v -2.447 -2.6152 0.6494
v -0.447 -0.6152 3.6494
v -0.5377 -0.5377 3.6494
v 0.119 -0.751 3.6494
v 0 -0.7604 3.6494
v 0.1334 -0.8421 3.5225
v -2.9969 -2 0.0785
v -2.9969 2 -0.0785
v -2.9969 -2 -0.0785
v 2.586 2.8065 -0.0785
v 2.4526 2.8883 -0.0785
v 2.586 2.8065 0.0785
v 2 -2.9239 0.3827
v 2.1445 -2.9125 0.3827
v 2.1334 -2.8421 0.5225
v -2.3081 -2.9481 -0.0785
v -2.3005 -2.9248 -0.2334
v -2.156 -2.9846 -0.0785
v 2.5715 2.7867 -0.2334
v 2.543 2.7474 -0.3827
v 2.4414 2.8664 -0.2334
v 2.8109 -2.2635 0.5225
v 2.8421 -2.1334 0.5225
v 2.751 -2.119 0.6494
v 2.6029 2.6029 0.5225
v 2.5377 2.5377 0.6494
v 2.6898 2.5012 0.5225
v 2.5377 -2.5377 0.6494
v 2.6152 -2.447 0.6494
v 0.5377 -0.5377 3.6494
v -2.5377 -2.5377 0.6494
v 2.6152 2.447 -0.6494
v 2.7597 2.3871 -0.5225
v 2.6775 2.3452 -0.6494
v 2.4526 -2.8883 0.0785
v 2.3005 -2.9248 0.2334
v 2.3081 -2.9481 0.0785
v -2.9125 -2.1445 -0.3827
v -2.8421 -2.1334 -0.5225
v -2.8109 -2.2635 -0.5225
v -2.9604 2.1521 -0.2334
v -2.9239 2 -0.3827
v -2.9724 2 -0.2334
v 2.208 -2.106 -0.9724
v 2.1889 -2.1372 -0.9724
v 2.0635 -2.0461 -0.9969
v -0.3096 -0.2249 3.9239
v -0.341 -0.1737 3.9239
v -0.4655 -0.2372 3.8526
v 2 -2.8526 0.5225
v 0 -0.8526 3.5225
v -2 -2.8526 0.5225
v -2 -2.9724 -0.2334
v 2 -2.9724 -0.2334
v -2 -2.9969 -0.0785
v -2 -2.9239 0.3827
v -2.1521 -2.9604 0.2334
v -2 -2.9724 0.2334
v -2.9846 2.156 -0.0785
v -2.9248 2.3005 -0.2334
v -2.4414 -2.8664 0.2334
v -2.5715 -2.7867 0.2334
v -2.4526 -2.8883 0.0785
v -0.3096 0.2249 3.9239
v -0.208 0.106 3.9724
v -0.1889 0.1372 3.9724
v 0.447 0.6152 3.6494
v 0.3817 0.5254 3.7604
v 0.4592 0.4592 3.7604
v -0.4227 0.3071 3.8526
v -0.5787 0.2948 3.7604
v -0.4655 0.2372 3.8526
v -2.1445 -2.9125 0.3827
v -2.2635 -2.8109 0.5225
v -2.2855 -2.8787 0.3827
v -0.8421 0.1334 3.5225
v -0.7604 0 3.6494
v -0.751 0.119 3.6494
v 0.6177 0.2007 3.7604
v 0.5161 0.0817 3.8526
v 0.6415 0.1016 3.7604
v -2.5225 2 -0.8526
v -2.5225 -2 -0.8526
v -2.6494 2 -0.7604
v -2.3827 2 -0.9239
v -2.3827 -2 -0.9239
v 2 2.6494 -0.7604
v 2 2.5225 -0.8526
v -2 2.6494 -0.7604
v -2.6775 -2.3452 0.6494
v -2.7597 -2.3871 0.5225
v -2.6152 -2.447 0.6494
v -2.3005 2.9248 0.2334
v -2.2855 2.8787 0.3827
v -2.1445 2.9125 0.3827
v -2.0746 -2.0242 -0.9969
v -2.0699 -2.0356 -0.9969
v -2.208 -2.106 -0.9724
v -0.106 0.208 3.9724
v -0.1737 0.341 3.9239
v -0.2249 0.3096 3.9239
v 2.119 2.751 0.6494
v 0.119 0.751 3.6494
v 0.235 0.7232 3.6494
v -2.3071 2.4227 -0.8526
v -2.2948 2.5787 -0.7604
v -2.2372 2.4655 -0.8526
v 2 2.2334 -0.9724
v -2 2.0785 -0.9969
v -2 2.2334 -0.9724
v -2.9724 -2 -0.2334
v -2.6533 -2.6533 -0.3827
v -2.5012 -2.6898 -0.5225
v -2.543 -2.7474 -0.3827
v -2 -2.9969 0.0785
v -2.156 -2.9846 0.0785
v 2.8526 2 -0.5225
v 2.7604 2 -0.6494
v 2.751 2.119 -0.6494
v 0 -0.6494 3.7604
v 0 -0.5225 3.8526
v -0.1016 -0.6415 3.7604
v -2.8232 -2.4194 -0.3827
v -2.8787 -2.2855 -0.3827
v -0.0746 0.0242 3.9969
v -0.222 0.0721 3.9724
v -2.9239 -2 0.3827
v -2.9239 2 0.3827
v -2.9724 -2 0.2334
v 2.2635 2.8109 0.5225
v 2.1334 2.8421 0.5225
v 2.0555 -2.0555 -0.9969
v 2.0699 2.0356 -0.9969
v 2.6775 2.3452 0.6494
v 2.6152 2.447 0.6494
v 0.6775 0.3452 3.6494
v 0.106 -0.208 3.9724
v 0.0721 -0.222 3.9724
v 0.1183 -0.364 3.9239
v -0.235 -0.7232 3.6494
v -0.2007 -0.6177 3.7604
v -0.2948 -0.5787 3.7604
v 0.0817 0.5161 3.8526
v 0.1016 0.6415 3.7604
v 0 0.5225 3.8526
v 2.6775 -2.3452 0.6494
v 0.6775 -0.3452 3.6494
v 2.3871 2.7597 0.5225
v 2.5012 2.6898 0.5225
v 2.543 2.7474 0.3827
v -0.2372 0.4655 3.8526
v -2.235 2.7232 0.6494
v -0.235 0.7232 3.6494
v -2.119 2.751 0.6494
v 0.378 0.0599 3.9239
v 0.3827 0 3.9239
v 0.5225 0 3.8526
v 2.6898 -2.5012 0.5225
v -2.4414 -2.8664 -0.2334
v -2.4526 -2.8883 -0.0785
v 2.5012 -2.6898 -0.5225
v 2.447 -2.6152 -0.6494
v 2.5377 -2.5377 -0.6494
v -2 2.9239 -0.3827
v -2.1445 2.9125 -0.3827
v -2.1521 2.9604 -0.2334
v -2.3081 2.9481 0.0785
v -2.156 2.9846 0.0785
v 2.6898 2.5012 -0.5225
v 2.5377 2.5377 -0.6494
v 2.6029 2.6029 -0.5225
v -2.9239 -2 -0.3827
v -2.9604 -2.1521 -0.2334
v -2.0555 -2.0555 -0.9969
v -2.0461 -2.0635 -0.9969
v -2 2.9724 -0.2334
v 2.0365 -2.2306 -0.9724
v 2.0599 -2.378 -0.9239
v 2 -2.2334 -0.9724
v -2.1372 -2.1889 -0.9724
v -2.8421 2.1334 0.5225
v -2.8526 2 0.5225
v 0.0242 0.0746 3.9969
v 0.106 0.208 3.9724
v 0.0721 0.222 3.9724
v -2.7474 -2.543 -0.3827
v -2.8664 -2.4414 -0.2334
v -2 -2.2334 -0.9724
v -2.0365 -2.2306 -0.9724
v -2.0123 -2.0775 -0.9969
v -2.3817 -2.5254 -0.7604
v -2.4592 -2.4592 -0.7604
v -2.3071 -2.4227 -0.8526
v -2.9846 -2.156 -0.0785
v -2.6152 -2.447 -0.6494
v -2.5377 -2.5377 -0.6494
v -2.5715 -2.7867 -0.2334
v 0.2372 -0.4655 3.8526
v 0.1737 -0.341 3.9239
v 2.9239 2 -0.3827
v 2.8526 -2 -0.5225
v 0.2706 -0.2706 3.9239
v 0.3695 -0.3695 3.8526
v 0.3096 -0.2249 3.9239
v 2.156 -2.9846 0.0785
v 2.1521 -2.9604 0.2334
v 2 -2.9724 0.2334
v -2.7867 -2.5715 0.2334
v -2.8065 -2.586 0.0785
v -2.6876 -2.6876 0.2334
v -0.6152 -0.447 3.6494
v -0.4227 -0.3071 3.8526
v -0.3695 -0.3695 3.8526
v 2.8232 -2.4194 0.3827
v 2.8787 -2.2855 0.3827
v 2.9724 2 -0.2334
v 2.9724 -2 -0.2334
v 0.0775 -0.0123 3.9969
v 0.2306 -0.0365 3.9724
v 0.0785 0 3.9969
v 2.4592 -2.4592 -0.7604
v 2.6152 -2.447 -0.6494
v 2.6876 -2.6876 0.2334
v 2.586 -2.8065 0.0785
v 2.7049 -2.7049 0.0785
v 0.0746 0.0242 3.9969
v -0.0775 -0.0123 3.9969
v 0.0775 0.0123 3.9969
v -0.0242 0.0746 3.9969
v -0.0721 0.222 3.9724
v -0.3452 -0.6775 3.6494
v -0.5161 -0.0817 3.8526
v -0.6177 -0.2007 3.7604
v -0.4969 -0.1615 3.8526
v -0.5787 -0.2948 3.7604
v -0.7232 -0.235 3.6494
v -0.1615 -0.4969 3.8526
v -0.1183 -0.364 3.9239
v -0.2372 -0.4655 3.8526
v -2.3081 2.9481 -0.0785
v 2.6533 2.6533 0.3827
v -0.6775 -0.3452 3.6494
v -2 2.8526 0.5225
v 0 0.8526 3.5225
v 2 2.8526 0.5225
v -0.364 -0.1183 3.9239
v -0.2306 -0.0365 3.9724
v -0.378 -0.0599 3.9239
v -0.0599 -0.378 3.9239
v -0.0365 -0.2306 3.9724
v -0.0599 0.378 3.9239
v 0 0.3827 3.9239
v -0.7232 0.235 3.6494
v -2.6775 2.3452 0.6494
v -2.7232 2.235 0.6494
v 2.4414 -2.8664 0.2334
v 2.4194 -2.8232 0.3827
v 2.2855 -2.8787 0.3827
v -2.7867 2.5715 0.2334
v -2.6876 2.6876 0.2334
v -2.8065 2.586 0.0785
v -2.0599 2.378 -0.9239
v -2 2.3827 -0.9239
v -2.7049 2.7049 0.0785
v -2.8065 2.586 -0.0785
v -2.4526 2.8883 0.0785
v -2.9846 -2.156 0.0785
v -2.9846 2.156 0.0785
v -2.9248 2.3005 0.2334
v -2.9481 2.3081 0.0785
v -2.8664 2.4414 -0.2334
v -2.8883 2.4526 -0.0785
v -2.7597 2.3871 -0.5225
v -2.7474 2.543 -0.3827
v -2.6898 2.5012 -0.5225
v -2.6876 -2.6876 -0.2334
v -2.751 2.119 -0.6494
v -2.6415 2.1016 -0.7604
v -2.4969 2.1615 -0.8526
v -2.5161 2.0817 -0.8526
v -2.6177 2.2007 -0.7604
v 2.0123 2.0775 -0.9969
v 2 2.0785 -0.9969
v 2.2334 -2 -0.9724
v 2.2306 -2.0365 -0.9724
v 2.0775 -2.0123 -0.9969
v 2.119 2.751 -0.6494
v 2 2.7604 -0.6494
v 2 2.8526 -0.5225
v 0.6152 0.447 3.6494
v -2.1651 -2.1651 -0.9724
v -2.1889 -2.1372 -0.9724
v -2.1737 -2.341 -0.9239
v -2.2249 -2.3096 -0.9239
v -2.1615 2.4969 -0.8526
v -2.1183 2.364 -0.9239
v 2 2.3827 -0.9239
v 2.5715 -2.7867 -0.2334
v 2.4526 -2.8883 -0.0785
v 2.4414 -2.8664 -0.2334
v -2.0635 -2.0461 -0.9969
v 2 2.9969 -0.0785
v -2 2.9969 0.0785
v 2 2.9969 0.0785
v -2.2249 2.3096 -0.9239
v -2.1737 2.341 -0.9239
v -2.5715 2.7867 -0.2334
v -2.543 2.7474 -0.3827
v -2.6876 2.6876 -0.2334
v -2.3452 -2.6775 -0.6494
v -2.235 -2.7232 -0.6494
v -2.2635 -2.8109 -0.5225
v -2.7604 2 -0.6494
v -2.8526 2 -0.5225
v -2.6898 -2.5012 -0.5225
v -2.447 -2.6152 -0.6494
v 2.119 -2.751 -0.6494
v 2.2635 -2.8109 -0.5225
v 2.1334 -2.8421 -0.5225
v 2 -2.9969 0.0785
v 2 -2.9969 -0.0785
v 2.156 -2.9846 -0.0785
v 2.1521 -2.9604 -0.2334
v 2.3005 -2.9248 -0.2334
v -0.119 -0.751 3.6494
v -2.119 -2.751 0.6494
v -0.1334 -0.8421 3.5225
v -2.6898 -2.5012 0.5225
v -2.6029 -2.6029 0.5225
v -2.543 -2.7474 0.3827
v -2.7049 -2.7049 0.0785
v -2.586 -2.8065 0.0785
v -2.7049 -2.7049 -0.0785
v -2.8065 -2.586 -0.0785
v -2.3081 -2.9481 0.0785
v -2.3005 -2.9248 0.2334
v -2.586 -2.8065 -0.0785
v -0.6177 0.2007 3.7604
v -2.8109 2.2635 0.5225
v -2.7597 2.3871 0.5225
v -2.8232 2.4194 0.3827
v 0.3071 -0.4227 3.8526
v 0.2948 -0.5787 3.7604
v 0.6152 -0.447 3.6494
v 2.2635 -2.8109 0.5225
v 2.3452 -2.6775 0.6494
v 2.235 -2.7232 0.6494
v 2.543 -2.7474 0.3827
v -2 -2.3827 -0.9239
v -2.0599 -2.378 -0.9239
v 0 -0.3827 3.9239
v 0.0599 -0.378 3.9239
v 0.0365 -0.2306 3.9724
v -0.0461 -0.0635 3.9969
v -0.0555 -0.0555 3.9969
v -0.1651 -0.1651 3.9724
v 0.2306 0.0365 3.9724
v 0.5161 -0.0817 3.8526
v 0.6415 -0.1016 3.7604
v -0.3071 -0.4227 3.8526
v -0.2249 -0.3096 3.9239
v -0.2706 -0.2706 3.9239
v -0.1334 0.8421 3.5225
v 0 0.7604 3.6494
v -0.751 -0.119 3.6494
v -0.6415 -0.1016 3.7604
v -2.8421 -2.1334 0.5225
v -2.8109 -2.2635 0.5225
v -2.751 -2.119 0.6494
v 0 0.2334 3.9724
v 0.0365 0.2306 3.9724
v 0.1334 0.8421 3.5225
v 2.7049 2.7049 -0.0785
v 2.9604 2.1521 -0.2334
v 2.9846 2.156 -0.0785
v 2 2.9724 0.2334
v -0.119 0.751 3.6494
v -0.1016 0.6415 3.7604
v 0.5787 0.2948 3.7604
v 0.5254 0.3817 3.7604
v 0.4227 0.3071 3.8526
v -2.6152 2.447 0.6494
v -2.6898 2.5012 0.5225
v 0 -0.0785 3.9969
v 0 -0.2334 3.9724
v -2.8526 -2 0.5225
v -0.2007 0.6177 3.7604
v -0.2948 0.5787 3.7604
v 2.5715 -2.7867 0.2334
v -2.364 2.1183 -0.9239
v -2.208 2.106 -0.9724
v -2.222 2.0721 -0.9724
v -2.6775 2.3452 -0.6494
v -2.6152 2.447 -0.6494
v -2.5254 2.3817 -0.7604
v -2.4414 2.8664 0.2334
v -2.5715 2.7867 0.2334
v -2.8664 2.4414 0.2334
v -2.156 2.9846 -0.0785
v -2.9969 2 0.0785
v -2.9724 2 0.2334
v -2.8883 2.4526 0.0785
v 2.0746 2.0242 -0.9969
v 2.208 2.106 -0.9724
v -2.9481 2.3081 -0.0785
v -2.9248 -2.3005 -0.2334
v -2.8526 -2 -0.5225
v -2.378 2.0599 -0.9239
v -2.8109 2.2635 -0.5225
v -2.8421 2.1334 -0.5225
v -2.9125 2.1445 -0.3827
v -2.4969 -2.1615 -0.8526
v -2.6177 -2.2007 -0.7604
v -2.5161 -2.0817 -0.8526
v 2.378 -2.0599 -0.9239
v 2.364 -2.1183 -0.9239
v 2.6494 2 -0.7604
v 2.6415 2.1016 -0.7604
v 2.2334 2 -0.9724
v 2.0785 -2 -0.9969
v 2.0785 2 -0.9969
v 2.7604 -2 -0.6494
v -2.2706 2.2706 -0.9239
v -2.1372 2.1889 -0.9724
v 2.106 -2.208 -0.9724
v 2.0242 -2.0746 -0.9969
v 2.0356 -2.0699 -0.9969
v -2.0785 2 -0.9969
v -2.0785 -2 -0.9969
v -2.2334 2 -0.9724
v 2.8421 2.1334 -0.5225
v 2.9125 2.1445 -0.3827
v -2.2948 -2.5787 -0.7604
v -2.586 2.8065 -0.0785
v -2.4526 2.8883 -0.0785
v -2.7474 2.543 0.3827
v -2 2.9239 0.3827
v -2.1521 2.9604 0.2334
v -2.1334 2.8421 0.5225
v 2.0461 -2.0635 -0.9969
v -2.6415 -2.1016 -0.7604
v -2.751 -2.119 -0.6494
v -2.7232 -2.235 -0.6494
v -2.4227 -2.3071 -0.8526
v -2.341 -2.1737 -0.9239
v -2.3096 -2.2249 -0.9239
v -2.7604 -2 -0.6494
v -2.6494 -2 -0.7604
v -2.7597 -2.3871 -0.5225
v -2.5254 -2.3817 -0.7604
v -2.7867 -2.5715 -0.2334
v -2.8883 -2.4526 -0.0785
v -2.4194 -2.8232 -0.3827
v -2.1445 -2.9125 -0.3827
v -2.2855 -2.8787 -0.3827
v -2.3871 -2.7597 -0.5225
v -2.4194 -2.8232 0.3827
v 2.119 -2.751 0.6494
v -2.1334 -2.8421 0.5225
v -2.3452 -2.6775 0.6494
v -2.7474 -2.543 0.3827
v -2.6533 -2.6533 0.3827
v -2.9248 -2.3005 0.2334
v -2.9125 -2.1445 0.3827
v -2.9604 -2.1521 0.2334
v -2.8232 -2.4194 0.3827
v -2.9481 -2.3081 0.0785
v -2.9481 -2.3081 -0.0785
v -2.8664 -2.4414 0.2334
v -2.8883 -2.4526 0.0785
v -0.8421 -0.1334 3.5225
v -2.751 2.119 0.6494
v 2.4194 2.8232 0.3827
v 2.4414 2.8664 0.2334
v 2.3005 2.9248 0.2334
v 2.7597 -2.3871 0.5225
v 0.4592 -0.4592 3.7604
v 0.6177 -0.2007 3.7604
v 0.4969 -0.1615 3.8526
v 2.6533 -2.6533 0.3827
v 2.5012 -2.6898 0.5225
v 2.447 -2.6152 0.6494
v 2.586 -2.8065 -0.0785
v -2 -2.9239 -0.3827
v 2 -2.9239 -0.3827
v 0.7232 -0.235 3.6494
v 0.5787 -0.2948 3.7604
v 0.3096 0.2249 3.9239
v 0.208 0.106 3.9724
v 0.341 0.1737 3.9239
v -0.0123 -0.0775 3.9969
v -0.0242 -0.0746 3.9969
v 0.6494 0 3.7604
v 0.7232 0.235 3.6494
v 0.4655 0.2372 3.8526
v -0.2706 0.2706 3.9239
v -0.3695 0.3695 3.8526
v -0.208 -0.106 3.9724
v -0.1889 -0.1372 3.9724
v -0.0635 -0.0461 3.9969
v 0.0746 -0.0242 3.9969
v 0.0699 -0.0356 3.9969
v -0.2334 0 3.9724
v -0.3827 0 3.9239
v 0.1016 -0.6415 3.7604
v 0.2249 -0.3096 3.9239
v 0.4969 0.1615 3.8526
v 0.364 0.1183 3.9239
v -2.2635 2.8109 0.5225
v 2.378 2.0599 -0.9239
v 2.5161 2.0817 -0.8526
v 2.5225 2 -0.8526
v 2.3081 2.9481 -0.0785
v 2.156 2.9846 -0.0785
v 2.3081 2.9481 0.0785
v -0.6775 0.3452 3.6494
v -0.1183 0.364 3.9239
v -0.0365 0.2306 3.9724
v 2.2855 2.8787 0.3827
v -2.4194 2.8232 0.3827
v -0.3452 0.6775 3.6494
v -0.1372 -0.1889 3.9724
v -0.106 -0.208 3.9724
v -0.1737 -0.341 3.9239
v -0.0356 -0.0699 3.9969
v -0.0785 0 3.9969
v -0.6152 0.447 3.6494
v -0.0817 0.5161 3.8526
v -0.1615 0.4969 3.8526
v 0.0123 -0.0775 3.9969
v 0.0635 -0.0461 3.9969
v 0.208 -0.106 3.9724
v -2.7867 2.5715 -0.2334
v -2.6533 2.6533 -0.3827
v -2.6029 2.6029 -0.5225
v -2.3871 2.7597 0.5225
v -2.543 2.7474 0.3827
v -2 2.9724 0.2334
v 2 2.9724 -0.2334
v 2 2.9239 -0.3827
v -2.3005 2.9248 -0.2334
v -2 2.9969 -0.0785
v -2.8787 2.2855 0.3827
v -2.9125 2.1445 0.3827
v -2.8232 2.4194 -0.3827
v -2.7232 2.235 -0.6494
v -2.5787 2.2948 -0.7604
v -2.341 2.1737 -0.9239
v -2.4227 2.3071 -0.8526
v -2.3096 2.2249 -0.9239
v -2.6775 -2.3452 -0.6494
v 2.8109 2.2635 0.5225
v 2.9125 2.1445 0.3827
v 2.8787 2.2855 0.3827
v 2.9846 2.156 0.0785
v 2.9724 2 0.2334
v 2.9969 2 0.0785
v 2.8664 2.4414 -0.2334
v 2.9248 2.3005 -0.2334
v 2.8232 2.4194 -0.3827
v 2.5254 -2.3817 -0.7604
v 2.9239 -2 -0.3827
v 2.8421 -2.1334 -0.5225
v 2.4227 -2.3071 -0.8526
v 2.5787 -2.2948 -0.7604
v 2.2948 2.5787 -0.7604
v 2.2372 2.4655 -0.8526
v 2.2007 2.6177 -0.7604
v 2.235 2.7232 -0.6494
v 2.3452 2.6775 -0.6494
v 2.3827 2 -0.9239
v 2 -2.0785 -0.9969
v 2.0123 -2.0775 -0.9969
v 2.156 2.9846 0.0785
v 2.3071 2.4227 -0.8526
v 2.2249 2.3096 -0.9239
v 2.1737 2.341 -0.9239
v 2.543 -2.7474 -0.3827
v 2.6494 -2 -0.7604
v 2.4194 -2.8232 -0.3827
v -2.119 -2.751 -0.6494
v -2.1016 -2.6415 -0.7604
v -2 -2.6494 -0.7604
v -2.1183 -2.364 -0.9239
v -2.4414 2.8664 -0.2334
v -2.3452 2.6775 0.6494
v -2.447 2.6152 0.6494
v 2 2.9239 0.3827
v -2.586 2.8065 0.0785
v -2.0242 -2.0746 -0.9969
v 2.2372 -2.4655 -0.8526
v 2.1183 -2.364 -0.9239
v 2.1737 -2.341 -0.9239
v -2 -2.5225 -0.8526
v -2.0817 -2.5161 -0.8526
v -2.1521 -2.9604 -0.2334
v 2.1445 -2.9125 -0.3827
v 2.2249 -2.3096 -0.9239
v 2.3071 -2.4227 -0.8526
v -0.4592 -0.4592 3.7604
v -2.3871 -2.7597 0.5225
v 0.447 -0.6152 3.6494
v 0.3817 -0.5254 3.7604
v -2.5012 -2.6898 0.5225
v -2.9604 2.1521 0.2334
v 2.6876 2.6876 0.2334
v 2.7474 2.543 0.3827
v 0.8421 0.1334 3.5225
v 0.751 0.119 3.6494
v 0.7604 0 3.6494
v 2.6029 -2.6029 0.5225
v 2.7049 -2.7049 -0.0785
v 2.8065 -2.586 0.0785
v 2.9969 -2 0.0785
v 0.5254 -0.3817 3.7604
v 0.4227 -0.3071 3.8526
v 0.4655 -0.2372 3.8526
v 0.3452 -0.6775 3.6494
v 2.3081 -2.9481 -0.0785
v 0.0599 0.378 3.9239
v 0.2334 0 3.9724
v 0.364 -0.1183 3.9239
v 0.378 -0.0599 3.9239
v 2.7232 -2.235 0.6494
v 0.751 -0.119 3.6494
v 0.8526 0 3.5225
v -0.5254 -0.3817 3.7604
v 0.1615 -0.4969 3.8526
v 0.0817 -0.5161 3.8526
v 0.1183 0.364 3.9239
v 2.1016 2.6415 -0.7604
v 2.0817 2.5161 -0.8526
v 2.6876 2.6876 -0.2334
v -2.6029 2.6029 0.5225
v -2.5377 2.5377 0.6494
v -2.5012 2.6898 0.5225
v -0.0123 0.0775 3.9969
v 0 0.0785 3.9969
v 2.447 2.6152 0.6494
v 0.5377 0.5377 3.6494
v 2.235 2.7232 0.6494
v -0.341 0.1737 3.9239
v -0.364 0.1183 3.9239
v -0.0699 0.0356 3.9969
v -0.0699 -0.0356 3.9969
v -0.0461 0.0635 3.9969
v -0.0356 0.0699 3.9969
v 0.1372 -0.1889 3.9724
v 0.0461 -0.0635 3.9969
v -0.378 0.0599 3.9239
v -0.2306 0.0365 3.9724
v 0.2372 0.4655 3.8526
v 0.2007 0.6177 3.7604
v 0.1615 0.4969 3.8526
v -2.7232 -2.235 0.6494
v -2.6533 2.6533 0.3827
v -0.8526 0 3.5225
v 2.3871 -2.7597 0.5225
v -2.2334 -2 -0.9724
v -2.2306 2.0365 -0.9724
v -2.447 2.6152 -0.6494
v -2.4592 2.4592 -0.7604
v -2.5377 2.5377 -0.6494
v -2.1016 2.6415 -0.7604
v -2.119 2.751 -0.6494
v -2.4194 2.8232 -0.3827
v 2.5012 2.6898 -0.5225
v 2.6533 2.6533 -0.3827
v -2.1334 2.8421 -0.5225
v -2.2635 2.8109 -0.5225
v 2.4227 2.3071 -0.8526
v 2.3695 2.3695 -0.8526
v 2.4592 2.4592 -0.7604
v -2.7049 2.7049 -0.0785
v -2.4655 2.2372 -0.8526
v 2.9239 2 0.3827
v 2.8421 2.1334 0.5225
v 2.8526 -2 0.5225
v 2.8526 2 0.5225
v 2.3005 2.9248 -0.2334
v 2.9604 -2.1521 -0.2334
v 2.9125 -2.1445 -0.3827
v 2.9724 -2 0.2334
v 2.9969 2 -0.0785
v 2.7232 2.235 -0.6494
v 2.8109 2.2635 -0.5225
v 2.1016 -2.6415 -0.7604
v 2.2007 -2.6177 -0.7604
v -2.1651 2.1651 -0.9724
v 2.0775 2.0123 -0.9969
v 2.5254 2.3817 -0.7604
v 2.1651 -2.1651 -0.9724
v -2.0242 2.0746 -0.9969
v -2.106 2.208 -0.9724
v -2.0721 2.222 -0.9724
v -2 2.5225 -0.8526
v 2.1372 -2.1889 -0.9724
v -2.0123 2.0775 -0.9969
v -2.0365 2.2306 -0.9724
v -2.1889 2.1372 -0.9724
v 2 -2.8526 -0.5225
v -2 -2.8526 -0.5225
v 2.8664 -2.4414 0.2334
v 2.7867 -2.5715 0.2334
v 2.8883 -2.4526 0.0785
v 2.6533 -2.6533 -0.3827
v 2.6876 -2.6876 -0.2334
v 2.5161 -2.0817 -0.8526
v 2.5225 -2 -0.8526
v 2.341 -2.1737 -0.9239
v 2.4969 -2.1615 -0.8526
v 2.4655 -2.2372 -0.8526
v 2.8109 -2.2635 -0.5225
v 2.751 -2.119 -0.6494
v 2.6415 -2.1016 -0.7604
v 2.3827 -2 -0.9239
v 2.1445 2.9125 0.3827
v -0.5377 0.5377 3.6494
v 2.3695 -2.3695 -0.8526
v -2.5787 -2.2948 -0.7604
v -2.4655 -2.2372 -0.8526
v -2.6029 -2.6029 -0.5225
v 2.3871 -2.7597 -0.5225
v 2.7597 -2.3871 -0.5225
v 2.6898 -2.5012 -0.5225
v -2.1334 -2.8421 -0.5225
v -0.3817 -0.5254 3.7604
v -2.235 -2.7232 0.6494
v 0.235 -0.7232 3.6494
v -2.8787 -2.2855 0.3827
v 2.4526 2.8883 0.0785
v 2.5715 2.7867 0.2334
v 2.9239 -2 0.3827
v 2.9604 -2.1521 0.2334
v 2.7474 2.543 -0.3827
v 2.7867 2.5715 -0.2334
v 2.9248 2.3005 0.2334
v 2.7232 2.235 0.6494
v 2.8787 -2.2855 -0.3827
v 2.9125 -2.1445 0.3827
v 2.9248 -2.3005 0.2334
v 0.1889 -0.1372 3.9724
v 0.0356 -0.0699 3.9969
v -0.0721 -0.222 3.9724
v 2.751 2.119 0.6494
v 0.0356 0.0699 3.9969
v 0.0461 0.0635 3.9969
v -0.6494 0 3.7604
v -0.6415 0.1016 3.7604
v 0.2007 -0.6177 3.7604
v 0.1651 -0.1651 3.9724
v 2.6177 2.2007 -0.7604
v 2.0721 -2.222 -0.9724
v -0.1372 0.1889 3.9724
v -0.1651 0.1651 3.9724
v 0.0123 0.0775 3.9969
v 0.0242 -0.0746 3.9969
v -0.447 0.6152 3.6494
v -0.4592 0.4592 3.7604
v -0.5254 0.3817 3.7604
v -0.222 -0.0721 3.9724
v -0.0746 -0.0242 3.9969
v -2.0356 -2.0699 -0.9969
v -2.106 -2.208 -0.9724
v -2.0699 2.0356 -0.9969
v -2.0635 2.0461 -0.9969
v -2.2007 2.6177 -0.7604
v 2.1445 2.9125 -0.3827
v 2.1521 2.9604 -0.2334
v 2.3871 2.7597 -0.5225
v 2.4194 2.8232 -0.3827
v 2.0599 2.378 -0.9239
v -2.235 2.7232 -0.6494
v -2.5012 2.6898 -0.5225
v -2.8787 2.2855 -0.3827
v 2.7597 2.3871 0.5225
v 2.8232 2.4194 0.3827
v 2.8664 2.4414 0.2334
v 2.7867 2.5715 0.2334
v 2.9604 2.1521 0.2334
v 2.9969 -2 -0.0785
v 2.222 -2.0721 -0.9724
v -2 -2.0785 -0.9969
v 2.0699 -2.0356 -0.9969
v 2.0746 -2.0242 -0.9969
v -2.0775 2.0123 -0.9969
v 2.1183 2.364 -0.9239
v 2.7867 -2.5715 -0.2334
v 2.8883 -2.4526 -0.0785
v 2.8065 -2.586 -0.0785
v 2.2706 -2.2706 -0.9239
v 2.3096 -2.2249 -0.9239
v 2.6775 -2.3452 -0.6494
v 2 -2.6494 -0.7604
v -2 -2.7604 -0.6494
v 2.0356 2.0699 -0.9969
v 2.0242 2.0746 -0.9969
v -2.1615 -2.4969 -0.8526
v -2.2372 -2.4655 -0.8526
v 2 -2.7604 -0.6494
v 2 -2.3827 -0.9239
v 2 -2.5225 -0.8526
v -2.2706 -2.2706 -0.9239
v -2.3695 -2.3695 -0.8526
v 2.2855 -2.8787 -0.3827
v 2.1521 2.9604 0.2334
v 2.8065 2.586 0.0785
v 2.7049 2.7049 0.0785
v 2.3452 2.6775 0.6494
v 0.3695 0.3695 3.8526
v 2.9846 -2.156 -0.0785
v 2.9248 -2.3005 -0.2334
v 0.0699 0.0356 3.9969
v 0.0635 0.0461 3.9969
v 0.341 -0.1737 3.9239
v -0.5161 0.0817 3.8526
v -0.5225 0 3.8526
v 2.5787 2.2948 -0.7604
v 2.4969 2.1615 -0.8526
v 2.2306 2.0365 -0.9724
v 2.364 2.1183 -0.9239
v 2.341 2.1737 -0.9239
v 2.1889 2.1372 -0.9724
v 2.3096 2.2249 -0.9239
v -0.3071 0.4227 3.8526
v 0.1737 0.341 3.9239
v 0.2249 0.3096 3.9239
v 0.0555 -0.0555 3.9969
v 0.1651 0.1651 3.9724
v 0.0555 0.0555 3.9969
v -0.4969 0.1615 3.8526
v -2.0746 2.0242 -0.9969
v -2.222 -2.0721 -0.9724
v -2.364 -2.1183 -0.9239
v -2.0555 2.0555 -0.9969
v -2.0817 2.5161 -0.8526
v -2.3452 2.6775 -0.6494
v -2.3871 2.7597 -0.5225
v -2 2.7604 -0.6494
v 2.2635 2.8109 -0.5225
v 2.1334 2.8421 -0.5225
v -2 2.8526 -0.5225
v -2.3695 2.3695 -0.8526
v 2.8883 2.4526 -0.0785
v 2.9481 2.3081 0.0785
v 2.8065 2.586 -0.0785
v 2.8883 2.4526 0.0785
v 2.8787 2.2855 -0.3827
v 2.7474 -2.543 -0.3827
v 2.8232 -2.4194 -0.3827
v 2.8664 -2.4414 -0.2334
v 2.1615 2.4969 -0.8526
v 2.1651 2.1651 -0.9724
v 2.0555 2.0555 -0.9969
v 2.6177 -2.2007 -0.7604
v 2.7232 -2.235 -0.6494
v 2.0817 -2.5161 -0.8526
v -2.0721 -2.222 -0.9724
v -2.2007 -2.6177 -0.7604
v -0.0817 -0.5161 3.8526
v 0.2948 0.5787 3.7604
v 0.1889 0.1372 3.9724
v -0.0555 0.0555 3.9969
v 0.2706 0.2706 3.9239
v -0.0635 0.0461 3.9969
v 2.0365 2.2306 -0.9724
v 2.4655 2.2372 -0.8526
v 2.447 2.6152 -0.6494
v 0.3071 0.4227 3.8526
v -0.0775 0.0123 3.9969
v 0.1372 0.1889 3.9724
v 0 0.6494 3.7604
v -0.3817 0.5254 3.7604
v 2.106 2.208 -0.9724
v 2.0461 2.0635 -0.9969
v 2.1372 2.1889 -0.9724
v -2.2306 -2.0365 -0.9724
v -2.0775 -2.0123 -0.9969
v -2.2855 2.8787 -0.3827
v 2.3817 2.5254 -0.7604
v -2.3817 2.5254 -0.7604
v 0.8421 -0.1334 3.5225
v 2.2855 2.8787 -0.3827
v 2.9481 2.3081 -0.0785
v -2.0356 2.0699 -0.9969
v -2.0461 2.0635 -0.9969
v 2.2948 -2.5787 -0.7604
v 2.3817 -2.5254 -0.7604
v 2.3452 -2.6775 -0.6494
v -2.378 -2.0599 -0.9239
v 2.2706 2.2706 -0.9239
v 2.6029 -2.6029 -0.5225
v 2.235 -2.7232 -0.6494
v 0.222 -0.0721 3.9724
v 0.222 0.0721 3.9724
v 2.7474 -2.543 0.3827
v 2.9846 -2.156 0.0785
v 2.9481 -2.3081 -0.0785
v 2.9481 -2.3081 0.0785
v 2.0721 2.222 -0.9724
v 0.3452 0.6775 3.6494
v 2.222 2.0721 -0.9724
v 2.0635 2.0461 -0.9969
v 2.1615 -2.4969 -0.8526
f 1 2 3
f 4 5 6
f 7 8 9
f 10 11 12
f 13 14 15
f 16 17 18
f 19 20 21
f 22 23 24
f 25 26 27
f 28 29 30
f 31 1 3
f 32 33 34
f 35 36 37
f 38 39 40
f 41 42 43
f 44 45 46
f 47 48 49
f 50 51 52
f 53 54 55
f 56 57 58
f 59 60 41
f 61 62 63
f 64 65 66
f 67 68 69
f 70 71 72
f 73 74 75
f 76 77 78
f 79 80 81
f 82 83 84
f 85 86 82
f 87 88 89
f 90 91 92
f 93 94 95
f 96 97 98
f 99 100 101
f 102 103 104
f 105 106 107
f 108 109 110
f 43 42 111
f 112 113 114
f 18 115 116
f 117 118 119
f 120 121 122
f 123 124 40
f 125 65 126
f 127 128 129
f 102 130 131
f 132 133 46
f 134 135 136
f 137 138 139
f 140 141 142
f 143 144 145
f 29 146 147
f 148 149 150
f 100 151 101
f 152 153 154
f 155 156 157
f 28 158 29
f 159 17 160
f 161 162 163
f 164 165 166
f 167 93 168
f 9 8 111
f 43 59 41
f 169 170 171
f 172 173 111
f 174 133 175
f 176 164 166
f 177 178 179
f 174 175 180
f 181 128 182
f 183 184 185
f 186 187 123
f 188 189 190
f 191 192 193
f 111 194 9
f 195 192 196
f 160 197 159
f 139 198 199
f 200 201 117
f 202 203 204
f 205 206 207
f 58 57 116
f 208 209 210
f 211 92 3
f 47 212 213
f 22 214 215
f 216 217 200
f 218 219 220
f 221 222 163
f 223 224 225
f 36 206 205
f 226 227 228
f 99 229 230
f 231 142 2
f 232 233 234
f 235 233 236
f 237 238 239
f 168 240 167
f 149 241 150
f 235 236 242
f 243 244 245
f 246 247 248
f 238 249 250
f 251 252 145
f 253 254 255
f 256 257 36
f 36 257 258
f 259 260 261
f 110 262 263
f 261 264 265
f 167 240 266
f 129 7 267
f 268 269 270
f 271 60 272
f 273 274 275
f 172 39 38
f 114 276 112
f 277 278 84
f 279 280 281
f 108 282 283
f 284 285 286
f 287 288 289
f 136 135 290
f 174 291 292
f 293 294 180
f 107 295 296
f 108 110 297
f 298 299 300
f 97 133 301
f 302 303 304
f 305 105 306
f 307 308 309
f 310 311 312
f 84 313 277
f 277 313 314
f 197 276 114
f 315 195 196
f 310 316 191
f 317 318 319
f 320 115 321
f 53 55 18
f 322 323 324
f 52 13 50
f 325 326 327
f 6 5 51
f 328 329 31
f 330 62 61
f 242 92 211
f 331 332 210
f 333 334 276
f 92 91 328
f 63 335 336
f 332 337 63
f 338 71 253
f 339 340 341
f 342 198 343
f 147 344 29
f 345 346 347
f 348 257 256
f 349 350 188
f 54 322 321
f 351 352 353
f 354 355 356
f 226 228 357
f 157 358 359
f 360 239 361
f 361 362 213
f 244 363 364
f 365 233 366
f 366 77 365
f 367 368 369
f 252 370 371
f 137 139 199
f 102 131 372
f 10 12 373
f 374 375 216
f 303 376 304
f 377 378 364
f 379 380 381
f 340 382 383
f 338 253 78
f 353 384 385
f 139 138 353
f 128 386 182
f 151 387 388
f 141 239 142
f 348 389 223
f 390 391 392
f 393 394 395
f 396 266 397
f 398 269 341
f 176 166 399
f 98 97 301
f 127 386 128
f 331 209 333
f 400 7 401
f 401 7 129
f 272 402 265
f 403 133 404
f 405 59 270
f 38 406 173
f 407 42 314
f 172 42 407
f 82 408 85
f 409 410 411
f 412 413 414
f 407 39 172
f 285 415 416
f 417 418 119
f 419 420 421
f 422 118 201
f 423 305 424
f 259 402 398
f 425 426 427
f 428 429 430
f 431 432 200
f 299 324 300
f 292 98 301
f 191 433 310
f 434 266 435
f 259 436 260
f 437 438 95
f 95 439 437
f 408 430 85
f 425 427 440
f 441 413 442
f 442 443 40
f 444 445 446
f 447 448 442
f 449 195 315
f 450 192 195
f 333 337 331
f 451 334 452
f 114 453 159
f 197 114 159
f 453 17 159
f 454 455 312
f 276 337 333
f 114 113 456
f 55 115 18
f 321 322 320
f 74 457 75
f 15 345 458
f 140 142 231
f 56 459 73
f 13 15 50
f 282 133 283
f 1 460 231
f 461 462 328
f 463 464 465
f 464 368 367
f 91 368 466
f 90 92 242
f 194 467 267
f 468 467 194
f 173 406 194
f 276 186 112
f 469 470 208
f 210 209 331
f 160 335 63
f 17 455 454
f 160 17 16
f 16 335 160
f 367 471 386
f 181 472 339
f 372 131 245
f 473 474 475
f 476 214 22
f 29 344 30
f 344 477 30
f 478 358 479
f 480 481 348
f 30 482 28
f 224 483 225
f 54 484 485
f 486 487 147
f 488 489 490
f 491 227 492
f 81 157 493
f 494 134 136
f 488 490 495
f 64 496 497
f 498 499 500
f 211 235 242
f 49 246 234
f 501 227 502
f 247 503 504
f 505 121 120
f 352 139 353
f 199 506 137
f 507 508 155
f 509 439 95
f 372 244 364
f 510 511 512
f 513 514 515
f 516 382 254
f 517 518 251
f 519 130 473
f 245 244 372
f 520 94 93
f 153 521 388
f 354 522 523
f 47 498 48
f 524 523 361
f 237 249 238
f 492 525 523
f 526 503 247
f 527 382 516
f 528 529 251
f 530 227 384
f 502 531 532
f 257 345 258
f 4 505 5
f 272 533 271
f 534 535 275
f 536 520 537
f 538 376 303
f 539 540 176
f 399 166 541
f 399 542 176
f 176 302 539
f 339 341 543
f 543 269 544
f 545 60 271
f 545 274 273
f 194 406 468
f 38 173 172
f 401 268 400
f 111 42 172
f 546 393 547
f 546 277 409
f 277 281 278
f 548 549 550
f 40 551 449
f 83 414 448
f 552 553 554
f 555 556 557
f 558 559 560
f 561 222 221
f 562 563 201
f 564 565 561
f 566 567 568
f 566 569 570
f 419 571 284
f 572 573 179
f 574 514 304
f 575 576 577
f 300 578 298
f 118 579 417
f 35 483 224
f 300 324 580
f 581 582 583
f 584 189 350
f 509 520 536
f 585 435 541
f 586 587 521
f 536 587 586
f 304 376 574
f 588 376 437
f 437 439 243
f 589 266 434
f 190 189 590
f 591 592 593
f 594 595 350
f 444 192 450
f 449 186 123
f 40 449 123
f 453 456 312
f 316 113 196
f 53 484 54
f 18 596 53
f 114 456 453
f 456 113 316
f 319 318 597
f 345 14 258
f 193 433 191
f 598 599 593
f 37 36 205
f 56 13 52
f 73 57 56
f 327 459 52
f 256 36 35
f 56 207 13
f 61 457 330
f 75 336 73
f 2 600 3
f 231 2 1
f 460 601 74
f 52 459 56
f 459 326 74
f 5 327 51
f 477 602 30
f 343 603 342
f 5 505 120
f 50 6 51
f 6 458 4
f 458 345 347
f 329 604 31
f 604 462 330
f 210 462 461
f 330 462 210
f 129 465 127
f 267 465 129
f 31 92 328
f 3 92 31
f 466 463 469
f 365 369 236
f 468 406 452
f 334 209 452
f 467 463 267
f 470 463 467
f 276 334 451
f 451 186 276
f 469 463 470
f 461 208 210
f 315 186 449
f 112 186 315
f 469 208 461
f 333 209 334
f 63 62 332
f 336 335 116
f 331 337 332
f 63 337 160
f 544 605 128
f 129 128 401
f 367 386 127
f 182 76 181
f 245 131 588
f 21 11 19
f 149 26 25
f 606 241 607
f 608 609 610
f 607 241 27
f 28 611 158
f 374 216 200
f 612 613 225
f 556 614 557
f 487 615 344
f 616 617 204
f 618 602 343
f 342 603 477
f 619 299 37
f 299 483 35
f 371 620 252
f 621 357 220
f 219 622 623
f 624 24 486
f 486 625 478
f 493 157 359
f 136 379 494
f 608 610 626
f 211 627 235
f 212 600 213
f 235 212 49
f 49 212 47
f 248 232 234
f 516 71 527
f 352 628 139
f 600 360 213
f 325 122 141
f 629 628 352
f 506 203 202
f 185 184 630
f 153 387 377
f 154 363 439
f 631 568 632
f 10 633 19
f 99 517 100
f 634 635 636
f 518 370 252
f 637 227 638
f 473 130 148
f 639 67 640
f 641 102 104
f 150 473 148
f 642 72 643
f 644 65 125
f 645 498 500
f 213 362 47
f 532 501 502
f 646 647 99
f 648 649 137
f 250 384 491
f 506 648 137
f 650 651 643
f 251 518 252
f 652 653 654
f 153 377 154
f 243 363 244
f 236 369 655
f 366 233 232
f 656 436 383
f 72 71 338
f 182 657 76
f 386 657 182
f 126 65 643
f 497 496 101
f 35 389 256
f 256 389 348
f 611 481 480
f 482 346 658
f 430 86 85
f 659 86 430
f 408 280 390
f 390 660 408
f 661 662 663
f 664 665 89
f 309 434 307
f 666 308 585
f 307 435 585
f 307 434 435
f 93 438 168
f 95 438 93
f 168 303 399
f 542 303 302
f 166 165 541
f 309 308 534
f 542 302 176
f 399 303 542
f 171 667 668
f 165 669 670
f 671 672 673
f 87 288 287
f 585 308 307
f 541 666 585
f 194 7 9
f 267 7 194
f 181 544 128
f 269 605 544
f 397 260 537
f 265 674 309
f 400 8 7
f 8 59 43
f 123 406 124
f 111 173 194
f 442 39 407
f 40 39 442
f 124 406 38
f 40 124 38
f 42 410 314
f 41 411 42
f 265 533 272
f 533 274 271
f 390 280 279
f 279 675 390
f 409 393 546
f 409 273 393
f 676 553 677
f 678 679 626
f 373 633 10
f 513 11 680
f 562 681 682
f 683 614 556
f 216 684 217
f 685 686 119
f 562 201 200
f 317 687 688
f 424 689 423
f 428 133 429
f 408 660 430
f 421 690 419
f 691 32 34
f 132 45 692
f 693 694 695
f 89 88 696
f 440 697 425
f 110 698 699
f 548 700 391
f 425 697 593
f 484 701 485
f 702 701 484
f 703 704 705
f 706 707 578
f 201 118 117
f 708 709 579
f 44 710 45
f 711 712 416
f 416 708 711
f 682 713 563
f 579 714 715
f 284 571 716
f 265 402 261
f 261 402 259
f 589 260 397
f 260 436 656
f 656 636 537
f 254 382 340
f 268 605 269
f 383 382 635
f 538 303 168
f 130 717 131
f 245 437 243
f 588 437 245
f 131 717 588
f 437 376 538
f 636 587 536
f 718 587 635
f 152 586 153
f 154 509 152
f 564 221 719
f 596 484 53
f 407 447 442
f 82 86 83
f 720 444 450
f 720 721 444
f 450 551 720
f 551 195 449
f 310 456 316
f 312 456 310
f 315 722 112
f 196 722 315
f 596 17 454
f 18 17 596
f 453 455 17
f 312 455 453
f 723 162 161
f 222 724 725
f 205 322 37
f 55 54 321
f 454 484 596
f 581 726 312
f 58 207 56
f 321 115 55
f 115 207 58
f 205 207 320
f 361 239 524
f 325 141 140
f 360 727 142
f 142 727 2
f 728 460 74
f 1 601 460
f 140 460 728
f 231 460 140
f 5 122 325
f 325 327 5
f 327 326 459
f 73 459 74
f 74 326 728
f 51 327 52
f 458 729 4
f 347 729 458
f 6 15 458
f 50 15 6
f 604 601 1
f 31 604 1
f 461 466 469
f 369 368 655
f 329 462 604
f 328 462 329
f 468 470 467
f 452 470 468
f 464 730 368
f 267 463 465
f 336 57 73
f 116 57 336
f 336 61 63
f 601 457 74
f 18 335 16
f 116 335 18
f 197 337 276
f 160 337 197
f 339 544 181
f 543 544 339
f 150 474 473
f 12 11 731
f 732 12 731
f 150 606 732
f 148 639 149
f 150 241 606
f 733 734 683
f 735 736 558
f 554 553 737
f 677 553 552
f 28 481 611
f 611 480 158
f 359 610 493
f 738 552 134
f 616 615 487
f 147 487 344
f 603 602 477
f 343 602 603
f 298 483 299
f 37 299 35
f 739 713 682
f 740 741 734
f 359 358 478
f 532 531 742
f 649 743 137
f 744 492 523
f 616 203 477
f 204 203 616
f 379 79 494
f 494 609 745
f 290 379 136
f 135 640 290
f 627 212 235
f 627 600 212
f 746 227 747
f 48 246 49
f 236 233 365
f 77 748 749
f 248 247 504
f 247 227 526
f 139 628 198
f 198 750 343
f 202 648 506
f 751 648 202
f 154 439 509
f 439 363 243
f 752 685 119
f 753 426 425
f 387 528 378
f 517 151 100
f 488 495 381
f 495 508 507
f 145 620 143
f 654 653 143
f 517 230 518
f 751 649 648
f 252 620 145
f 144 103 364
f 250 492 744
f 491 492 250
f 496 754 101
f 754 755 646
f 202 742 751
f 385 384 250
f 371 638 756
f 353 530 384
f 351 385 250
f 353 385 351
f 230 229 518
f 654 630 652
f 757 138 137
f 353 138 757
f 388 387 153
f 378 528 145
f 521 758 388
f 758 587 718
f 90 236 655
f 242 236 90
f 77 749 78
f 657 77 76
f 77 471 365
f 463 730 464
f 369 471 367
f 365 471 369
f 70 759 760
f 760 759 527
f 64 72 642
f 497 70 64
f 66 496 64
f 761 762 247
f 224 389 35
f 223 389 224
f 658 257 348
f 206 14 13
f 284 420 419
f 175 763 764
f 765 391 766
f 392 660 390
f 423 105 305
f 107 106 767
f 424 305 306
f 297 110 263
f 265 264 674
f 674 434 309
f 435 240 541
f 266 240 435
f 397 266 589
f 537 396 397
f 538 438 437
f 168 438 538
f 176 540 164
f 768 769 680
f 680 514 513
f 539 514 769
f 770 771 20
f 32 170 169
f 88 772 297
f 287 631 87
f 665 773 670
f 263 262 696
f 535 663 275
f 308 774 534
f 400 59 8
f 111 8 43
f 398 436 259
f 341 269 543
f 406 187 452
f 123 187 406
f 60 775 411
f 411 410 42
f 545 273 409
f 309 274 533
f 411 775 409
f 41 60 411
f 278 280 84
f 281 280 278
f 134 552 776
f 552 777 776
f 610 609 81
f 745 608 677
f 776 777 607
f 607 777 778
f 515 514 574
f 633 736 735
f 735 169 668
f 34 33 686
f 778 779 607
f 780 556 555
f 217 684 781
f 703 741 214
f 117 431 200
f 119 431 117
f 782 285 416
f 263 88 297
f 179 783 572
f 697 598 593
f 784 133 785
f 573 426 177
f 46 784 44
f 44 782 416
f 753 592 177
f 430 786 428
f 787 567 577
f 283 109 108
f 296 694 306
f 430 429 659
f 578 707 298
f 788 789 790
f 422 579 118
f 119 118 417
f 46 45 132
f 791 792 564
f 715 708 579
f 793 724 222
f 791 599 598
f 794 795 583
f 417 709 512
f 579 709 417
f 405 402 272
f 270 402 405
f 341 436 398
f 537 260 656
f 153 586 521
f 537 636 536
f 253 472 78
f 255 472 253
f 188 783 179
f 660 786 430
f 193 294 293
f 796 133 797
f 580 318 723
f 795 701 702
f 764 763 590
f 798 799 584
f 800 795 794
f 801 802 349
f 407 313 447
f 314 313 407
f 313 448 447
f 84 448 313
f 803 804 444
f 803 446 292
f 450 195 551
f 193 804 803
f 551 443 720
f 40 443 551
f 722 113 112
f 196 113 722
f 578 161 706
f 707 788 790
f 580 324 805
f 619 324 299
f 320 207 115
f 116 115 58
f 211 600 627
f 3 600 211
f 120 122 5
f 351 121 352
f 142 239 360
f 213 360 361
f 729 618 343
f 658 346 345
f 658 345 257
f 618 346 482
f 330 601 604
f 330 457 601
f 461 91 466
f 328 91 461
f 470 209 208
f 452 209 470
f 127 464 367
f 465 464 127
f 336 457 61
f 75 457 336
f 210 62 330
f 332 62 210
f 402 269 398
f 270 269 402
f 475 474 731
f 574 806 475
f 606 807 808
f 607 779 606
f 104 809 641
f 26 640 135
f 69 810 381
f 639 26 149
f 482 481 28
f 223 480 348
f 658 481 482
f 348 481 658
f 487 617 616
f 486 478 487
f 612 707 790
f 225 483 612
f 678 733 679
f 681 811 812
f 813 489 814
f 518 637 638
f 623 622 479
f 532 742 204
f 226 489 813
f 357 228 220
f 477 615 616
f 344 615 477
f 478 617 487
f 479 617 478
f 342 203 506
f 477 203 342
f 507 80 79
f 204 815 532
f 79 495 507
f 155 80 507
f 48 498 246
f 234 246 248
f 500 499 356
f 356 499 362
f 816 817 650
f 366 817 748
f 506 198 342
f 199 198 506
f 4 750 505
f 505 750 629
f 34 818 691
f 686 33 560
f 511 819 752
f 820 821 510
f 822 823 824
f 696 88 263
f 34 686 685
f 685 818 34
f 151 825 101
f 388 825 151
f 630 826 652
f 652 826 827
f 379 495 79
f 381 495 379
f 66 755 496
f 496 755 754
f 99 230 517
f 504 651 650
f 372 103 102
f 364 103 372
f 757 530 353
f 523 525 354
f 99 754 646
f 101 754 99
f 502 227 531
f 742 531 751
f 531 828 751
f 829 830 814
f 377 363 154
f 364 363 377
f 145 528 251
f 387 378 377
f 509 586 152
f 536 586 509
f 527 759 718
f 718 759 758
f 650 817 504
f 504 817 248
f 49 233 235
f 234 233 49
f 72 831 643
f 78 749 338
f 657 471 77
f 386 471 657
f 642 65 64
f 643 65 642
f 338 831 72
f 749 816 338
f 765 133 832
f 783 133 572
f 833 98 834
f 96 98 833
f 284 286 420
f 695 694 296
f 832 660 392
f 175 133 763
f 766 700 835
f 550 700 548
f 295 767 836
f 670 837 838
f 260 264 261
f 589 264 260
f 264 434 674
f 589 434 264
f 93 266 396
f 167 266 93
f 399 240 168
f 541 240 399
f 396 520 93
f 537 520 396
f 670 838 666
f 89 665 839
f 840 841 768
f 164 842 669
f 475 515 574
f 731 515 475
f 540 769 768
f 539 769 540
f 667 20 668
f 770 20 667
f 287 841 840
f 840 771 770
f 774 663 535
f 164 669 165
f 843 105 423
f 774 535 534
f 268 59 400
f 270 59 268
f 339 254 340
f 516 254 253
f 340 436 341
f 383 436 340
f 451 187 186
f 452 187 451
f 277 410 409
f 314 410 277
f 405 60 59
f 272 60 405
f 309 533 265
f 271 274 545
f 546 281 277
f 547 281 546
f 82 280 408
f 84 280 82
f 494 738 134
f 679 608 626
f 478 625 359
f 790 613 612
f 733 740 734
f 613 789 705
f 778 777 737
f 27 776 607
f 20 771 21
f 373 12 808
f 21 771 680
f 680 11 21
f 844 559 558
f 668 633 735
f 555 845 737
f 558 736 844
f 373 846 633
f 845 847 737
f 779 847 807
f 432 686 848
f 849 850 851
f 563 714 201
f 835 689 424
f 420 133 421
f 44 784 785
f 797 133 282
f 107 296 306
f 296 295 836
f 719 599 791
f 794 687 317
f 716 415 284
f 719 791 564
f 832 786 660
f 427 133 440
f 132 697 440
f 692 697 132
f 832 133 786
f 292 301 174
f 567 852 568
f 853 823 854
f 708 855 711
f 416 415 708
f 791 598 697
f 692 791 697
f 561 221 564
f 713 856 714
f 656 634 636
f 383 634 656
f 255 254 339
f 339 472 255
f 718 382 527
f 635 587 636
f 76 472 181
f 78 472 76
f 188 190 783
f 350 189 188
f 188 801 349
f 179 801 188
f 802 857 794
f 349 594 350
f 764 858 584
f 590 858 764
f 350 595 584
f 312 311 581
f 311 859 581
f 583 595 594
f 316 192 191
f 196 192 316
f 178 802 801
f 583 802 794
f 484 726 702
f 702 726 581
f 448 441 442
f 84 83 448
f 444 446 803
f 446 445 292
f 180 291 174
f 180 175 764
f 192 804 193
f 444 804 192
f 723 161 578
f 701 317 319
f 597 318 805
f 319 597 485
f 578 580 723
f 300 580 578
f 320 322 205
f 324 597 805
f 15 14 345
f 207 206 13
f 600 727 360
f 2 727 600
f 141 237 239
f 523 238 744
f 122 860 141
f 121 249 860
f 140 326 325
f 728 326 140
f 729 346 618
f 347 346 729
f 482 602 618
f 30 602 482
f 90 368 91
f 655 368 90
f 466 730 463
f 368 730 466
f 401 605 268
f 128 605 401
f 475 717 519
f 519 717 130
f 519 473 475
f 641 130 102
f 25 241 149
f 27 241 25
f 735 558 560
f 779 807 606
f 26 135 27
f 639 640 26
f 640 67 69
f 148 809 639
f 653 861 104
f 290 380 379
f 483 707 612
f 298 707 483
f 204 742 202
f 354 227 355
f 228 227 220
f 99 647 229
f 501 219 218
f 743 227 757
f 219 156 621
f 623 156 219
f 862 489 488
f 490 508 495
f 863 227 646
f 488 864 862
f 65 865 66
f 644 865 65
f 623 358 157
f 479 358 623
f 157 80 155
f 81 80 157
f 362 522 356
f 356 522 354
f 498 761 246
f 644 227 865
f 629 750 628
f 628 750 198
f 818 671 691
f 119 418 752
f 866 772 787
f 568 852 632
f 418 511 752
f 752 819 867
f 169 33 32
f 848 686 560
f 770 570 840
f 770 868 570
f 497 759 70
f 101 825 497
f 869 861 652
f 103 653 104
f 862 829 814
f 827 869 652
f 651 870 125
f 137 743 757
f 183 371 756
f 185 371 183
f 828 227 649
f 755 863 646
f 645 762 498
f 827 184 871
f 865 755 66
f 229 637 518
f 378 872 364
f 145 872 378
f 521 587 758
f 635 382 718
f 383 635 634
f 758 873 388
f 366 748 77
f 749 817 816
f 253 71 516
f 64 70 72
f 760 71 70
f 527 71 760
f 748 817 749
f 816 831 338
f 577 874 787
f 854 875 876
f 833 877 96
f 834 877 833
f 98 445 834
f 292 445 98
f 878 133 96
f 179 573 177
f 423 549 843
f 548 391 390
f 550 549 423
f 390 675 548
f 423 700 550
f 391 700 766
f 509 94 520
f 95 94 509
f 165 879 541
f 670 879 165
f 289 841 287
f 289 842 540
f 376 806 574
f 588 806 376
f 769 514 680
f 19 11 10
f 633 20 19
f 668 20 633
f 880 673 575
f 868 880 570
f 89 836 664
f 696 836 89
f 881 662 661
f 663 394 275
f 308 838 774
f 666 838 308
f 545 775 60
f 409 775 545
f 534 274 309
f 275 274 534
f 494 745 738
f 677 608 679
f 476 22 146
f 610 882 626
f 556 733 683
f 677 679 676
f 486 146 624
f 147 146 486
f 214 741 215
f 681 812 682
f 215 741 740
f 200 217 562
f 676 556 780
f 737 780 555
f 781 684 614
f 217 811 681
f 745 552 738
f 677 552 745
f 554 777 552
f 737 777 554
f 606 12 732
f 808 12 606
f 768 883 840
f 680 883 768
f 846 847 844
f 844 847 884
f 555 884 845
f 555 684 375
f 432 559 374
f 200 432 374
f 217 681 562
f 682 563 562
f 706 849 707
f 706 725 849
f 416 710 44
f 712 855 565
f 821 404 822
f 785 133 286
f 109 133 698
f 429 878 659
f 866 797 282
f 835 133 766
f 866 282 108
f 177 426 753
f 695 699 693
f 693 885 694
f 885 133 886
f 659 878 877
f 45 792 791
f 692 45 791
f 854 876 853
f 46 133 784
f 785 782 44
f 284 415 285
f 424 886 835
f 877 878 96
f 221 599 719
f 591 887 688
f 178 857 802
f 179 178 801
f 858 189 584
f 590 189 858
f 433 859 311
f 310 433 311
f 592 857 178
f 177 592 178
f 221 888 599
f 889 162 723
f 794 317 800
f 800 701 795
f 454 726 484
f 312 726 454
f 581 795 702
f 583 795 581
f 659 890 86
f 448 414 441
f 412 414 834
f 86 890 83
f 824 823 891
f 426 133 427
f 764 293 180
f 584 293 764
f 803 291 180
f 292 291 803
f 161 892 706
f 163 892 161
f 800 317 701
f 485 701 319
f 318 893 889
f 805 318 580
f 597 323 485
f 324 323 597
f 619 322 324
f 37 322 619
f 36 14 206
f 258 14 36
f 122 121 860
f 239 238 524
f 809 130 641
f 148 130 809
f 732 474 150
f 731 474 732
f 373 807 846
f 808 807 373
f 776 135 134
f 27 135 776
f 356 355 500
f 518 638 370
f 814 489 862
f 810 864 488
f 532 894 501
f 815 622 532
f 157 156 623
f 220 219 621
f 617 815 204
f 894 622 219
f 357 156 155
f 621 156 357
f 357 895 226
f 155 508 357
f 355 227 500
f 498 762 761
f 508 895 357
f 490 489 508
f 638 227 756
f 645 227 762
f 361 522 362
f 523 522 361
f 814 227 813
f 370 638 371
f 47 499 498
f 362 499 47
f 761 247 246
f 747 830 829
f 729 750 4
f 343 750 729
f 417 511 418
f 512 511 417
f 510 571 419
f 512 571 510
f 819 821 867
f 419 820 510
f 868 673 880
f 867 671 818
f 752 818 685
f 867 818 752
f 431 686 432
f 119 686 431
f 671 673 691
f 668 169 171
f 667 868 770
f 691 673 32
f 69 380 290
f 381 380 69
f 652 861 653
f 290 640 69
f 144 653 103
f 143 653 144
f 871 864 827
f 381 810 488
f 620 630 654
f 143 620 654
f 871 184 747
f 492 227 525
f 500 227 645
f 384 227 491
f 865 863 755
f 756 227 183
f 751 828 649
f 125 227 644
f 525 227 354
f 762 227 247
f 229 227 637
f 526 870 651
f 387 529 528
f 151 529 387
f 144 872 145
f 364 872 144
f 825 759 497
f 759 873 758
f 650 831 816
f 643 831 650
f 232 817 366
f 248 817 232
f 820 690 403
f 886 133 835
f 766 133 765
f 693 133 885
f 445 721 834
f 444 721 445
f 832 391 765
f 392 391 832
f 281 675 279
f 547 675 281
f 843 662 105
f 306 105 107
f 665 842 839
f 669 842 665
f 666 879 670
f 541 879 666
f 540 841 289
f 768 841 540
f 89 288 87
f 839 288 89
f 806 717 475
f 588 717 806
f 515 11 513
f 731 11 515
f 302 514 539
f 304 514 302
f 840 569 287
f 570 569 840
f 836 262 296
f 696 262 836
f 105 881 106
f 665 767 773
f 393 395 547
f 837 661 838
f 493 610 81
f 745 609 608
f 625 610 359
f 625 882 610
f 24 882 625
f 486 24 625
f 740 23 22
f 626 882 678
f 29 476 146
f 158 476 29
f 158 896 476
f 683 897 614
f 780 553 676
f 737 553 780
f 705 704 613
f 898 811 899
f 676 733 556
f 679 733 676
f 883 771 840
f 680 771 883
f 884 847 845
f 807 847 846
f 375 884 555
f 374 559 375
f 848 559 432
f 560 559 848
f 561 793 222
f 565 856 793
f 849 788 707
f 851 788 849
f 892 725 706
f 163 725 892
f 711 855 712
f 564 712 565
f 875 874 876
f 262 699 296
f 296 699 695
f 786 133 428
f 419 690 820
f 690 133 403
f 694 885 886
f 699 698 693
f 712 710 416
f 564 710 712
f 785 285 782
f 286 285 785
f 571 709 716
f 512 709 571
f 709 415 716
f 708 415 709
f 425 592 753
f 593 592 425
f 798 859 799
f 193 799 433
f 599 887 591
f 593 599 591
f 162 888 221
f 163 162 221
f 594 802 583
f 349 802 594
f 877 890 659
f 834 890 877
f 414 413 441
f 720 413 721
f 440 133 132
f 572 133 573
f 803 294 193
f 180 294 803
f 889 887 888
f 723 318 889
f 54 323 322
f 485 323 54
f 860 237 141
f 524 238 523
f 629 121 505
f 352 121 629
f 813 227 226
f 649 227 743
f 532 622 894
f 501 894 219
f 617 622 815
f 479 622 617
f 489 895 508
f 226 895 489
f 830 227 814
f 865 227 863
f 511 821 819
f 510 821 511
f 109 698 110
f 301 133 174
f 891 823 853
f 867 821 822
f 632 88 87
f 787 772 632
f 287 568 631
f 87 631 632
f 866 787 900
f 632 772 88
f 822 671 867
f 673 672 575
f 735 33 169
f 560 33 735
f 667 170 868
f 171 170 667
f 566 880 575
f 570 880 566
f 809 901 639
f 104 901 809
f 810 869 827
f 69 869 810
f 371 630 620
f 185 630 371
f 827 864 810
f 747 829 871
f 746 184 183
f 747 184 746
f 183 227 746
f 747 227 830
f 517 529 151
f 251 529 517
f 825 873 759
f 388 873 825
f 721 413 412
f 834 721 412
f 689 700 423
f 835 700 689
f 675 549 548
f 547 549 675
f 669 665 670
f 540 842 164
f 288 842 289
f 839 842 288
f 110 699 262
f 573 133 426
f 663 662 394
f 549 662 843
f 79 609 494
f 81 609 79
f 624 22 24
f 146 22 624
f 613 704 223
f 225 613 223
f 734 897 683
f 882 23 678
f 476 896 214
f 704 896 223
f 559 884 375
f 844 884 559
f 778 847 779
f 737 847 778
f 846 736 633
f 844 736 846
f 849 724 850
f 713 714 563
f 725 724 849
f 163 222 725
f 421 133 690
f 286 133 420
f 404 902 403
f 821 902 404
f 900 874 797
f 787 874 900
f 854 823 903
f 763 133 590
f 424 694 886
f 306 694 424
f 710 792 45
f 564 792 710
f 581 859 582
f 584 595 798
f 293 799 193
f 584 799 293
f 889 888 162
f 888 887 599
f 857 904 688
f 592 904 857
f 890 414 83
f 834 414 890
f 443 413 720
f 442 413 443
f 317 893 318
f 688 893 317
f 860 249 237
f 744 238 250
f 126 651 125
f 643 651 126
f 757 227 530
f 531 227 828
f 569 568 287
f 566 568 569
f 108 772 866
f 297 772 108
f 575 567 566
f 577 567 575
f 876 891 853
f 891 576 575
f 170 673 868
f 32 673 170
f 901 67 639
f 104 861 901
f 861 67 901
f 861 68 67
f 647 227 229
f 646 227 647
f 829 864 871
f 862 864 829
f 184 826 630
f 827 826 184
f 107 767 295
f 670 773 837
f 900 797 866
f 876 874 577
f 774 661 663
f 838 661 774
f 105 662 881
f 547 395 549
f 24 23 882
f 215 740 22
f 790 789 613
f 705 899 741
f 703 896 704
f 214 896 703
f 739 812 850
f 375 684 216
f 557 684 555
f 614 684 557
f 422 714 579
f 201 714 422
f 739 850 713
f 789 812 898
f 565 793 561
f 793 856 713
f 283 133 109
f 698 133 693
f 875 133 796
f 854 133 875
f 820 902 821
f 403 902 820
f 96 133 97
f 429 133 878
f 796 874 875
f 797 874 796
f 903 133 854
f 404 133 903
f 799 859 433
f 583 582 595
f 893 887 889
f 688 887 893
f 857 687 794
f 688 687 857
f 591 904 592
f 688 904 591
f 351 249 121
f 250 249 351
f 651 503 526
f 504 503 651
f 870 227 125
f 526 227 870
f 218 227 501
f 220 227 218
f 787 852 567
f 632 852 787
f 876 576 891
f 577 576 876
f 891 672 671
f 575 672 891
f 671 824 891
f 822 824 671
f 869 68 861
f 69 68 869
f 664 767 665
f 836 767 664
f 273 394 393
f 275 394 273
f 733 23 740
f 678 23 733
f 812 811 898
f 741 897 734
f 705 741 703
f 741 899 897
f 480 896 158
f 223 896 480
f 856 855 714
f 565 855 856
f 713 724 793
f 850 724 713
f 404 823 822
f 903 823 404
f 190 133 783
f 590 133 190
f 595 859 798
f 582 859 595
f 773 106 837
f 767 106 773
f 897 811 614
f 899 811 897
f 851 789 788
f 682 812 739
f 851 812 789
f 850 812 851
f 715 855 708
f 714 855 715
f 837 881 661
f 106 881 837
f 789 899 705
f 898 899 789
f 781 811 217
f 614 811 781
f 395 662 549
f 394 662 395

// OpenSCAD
module CombineHullIcon () {
  module Sphere_() { sphere(r = 1); }
  d = 2;
  h = 3;
  hull() {
    translate([-d, -d, 0]) Sphere_();
    translate([-d,  d, 0]) Sphere_();
    translate([ d, -d, 0]) Sphere_();
    translate([ d,  d, 0]) Sphere_();
    translate([ 0,  0, h]) Sphere_();
  }
}

CombineHullIcon($fn = 40);
